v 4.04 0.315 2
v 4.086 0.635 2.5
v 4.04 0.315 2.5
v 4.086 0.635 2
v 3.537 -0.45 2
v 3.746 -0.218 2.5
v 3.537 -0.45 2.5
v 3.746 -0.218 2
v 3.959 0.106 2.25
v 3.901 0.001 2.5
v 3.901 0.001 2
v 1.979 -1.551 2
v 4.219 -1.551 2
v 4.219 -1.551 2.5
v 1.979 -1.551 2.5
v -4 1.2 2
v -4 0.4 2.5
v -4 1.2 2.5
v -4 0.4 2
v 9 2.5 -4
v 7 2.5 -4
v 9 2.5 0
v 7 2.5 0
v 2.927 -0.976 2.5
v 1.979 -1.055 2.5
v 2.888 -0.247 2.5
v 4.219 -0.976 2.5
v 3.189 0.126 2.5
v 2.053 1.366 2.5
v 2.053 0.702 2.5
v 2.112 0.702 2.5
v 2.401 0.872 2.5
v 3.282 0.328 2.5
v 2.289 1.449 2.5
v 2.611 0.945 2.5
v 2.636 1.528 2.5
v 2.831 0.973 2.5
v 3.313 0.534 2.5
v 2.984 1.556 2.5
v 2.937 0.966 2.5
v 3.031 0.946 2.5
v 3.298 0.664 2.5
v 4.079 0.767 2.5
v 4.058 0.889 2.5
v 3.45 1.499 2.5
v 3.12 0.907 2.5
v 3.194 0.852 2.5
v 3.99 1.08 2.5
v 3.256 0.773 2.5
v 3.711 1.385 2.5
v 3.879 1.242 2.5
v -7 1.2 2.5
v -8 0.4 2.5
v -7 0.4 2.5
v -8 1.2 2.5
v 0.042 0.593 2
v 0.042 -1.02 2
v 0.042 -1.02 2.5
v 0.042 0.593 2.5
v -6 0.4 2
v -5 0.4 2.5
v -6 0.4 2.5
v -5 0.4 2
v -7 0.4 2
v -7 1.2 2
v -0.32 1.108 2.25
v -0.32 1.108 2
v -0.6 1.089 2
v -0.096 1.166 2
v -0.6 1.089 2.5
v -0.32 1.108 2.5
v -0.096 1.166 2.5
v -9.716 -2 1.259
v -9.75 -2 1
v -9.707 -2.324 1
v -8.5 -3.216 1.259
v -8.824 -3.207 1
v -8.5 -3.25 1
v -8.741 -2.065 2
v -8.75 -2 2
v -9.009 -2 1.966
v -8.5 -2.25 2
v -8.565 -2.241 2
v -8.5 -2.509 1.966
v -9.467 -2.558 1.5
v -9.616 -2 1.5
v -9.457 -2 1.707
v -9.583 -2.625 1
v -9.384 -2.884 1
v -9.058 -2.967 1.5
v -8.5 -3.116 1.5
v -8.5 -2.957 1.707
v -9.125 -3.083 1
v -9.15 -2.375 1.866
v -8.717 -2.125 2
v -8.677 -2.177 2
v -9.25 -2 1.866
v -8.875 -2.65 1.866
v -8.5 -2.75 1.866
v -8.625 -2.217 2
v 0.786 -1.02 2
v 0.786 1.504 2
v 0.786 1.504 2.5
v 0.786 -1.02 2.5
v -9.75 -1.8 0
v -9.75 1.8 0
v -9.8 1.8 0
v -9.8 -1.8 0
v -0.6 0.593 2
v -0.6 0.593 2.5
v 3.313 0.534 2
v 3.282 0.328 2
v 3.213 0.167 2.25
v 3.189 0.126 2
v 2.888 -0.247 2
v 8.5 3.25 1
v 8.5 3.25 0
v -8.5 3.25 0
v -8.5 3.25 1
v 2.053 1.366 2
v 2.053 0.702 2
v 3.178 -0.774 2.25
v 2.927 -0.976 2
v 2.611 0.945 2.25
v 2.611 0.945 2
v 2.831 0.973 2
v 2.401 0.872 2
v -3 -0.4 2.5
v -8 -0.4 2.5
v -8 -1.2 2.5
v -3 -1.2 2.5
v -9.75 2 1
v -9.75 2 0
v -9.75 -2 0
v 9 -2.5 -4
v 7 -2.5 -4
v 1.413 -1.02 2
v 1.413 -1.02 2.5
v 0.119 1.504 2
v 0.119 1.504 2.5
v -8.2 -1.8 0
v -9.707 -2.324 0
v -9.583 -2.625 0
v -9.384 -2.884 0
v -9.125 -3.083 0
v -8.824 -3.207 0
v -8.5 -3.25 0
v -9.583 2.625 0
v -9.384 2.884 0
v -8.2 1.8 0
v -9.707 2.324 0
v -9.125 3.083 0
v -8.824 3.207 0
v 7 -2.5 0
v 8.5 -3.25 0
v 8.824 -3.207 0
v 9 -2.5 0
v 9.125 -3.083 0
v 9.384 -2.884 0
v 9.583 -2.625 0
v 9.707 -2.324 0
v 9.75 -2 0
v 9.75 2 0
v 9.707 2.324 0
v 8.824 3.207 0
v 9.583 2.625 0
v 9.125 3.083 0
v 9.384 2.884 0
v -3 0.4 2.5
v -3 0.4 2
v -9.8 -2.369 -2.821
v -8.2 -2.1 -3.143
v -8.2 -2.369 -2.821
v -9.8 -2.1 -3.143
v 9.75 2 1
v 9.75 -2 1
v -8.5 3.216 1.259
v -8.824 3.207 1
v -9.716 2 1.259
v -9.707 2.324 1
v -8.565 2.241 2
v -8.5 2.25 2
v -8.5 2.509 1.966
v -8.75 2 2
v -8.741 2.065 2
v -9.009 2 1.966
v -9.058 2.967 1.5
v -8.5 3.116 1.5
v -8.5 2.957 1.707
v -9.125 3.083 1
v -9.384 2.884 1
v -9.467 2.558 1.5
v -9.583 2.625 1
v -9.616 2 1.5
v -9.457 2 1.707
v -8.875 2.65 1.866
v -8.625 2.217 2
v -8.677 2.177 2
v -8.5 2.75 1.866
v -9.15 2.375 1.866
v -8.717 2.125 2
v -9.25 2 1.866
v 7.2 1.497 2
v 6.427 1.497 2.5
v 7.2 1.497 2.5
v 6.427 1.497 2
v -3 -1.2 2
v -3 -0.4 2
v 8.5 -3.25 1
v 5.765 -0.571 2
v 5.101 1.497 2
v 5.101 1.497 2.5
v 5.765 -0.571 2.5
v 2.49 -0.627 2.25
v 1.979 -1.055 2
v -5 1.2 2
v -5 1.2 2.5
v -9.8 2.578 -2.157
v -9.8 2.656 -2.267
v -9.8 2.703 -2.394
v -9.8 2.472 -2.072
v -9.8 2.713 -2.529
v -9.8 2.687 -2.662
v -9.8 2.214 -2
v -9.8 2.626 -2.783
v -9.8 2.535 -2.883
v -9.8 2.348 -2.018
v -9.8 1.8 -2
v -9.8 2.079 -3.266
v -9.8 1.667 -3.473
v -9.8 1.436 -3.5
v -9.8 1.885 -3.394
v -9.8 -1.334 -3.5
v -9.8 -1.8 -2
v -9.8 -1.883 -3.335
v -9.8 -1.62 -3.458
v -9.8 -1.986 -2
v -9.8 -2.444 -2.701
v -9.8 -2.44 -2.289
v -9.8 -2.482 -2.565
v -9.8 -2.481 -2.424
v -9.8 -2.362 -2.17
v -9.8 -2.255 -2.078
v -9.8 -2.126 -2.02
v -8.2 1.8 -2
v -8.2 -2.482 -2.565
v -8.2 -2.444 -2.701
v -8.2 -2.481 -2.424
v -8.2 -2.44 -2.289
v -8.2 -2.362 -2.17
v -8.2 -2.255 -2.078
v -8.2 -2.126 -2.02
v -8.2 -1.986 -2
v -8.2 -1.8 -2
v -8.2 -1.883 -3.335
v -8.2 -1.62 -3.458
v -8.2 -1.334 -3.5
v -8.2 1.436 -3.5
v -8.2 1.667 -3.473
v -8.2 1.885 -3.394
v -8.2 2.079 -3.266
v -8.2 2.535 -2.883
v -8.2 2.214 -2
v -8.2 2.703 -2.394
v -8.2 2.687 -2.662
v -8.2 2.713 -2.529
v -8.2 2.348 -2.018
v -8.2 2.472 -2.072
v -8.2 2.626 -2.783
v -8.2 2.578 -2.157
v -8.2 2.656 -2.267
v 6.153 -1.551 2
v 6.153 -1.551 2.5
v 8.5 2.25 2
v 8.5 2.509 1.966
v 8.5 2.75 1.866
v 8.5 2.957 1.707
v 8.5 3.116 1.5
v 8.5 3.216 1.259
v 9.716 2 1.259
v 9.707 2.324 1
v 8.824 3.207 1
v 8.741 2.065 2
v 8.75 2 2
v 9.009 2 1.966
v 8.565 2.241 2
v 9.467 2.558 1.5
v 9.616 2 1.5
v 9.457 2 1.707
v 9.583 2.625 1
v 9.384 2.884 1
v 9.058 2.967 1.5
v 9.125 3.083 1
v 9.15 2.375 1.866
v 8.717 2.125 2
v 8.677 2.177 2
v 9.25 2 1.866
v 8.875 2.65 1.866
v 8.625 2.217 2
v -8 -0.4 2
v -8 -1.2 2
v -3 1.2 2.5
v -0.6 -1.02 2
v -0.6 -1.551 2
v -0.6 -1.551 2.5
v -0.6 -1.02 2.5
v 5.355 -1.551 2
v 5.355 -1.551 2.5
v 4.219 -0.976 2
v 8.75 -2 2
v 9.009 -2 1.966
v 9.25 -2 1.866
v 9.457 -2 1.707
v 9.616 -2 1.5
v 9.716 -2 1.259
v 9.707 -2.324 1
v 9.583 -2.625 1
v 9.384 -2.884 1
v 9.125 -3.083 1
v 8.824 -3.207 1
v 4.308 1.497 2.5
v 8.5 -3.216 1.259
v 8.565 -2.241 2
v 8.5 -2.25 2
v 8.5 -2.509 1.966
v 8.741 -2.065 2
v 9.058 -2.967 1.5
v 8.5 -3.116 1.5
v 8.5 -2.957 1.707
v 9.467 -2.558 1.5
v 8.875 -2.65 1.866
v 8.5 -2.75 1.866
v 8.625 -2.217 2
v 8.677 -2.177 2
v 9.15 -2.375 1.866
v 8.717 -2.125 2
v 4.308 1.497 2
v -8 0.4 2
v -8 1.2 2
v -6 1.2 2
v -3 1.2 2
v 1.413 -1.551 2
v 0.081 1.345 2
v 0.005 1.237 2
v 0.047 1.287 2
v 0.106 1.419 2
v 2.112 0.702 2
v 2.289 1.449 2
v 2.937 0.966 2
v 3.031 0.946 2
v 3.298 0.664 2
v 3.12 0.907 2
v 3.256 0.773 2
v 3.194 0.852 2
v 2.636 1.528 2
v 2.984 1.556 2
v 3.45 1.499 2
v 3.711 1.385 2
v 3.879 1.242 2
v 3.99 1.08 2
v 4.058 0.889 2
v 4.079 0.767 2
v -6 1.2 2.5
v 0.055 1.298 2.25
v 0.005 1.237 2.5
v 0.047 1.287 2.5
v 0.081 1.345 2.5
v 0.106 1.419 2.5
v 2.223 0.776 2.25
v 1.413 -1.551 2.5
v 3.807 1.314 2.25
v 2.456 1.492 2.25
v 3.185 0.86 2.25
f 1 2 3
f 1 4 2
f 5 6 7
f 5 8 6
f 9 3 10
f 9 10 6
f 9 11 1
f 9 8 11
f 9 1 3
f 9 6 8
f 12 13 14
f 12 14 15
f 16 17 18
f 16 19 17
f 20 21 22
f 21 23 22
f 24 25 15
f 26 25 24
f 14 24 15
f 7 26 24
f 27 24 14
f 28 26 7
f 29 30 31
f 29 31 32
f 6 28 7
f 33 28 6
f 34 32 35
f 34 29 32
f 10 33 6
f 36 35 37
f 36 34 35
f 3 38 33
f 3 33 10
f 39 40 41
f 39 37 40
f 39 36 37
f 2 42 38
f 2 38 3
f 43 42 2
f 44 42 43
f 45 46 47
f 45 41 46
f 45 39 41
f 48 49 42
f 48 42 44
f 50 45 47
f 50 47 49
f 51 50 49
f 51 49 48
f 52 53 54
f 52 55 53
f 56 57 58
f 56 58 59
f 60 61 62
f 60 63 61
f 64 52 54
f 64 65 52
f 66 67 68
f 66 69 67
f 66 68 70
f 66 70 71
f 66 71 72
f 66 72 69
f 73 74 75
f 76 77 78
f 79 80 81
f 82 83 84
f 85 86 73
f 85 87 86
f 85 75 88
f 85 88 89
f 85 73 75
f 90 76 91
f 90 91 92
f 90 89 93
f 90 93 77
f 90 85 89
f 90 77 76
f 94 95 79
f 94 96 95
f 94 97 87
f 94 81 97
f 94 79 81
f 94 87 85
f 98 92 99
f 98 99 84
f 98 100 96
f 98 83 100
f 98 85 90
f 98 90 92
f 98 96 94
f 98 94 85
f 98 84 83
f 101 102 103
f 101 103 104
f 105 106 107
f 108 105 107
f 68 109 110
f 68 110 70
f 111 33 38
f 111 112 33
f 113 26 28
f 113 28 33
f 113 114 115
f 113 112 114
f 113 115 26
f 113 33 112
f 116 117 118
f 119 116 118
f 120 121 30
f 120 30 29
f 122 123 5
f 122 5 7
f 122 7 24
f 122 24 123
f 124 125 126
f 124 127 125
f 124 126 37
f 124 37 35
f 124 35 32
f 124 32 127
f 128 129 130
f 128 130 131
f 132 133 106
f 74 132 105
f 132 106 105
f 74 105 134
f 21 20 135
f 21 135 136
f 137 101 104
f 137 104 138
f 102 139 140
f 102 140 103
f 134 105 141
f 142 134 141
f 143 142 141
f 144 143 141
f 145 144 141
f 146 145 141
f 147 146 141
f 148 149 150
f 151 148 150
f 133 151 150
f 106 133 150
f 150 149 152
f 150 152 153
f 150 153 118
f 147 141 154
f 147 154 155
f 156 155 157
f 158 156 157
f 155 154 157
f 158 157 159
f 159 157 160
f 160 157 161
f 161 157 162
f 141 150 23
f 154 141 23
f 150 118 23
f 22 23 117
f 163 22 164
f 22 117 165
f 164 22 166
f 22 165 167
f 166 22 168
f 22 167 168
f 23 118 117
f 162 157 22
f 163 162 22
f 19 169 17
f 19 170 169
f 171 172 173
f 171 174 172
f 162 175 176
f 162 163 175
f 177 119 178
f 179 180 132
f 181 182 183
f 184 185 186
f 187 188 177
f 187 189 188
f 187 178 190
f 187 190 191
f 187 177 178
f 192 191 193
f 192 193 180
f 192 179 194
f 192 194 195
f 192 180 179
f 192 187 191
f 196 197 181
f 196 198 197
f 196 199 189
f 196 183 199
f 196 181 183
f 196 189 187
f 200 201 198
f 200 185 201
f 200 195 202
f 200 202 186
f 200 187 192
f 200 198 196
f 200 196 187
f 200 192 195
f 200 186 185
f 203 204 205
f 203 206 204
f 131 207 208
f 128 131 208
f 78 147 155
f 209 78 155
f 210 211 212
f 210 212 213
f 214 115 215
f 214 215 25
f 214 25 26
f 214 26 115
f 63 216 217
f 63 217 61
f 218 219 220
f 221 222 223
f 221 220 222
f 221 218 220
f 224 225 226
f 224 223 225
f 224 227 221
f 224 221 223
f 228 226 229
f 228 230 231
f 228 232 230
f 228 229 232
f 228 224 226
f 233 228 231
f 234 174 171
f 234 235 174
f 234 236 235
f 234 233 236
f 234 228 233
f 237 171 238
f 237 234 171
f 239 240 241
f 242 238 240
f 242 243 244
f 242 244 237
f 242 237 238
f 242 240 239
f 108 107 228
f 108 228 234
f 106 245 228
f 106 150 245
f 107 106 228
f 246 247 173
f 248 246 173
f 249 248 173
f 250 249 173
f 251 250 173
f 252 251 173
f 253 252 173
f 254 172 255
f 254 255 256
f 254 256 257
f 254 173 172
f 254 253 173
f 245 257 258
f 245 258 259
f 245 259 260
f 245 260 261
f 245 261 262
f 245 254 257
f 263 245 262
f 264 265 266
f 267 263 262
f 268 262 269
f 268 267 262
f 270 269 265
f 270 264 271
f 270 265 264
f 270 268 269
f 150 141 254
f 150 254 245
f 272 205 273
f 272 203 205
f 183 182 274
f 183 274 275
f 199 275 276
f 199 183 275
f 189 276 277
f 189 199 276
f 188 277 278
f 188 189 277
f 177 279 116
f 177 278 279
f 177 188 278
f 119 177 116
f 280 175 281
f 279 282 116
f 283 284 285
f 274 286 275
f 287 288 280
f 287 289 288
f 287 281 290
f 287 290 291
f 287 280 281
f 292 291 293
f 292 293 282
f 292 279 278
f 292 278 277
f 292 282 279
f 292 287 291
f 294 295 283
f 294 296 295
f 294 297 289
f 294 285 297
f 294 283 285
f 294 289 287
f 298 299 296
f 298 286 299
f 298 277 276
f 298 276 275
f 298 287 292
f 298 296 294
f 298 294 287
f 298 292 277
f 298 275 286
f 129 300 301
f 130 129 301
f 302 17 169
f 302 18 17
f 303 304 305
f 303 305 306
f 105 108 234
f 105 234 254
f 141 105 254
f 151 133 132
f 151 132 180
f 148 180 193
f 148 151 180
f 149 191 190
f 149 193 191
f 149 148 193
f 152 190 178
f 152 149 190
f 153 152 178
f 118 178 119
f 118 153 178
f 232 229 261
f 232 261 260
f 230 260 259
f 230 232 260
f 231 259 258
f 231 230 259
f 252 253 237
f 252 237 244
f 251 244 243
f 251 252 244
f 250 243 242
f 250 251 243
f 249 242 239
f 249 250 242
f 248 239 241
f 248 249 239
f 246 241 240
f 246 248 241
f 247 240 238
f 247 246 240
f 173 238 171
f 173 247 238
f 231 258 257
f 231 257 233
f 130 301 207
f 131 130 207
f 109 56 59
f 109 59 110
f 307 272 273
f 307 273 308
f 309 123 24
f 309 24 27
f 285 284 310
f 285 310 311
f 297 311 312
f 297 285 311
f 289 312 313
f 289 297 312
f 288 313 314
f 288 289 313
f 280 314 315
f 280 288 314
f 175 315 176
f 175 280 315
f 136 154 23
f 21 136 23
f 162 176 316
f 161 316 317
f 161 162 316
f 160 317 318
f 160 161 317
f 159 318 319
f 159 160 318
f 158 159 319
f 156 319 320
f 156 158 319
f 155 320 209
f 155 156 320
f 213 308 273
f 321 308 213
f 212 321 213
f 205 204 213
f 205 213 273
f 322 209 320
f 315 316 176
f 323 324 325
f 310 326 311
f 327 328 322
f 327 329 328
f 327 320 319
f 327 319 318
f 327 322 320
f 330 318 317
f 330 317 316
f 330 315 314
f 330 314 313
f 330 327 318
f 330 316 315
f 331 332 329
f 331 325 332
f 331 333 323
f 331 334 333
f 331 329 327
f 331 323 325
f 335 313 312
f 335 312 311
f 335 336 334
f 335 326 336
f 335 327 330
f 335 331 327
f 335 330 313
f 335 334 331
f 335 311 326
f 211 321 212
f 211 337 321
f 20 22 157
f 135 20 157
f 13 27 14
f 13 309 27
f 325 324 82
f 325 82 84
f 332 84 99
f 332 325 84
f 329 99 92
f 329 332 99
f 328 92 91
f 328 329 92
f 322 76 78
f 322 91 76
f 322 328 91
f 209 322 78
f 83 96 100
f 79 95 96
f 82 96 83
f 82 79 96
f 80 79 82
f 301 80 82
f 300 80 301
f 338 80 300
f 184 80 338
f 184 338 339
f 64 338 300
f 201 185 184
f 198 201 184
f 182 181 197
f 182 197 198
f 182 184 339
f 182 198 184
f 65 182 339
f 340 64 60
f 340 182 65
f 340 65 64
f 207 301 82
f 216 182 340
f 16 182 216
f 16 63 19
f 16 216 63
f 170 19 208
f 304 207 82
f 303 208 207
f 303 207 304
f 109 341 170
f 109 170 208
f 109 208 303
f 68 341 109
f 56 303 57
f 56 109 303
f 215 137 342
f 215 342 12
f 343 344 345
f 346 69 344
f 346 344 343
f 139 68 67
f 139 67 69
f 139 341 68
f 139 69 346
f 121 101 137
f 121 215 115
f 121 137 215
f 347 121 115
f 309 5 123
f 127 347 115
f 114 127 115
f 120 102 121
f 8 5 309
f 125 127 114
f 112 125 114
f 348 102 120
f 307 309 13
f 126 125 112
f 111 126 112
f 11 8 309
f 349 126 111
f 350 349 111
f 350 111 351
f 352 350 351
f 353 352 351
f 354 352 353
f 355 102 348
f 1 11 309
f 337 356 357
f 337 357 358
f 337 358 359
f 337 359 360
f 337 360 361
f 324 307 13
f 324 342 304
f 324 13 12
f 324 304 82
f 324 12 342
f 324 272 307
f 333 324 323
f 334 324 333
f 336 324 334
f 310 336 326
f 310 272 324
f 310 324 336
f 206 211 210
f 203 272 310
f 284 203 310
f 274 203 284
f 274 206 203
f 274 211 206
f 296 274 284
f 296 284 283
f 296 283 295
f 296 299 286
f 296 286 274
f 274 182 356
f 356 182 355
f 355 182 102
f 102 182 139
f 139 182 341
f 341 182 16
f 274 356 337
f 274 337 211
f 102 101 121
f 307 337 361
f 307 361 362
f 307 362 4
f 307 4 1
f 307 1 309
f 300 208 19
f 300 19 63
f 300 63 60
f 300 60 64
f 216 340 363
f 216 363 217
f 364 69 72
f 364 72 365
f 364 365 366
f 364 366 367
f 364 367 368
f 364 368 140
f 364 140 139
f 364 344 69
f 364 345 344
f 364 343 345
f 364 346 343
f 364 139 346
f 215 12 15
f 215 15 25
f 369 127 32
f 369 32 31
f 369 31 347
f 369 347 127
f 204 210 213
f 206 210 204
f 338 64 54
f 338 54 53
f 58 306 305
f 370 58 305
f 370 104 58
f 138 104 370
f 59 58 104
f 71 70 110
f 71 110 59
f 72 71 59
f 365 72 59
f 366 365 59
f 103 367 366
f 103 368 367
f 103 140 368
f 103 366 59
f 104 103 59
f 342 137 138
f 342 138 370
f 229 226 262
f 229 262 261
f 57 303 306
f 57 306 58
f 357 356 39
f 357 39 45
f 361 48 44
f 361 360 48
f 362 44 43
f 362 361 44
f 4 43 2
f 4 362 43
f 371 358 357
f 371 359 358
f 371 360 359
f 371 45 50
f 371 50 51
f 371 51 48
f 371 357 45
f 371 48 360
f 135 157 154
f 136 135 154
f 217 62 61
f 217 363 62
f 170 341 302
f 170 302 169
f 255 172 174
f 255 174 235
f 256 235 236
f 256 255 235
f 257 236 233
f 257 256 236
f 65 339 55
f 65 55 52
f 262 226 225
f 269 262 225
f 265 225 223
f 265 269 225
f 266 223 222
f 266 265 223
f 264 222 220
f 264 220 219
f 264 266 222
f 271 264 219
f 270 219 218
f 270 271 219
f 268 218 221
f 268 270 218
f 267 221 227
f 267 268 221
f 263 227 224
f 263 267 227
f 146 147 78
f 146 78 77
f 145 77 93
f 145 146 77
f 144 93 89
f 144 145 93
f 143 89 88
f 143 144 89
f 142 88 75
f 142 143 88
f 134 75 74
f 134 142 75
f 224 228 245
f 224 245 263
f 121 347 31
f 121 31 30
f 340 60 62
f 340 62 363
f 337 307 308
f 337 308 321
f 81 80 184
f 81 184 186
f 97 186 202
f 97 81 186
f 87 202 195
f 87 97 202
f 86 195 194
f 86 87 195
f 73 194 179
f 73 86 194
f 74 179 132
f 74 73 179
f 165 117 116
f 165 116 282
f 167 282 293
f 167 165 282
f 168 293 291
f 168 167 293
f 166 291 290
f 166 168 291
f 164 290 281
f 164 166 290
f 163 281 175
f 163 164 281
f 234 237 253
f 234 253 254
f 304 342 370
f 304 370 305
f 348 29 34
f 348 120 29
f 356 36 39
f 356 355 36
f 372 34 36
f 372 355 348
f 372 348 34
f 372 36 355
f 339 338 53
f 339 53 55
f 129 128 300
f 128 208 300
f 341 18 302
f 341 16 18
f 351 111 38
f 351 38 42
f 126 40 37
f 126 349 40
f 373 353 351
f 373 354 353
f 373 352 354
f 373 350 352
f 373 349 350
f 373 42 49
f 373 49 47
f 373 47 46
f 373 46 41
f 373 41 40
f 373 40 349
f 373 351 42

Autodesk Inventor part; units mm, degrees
ref_plane "YZ Plane" through (0, 0, 0) normal (1, 0, 0) x (0, 1, 0)
ref_plane "XZ Plane" through (0, 0, 0) normal (0, 1, 0) x (-1, 0, 0)
ref_plane "XY Plane" through (0, 0, 0) normal (0, 0, 1) x (1, 0, 0)
sketch "Sketch1" plane through (0, 0, 0) normal (0, 0, 1) x (1, 0, 0)
  line L0 (10, 0) -> (10, 2) projected
  arc A0 (10, 2) -> (8.5, 3.5) centre (8.5, 2) ccw projected
  line L1 (8.5, 3.5) -> (-8.5, 3.5) projected
  arc A1 (-8.5, 3.5) -> (-10, 2) centre (-8.5, 2) ccw projected
  line L2 (-10, 2) -> (-8, 2) projected
  line L3 (-8, 2) -> (-8, 0) projected
  line L4 (-6, 0) -> (-8, 0) projected
  arc A2 (0, 0) -> (-6, 0) centre (-3, 0) ccw projected
  line L5 (7, 0) -> (0, 0) projected
  line L6 (7, 0) -> (7, 2.5) projected
  line L7 (7, 2.5) -> (9, 2.5) projected
  line L8 (9, 2.5) -> (9, 0) projected
  line L9 (10, 0) -> (9, 0) projected
  line L10 (-8, -2) -> (-10, -2) projected
  arc A3 (-10, -2) -> (-8.5, -3.5) centre (-8.5, -2) ccw projected
  line L11 (8.5, -3.5) -> (-8.5, -3.5) projected
  arc A4 (8.5, -3.5) -> (10, -2) centre (8.5, -2) ccw projected
  line L12 (10, 0) -> (10, -2) projected
  line L13 (9, 0) -> (10, 0) projected
  line L14 (9, 0) -> (9, -2.5) projected
  line L15 (9, -2.5) -> (7, -2.5) projected
  line L16 (7, -2.5) -> (7, 0) projected
  line L17 (0, 0) -> (7, 0) projected
  arc A5 (-6, 0) -> (0, 0) centre (-3, 0) ccw projected
  line L18 (-8, 0) -> (-6, 0) projected
  line L19 (-8, 0) -> (-8, -2) projected
  line L20 (-10, 2) -> (-10, 0) projected
  line L21 (-10, -2) -> (-10, 0) projected
  circle A6 centre (-8.5, 2) radius 1.25
  circle A7 centre (-8.5, -2) radius 1.25
  circle A8 centre (8.5, -2) radius 1.25
  circle A9 centre (8.5, 2) radius 1.25
  line L22 (8.5, 3.25) -> (-8.5, 3.25)
  line L23 (-9.75, 2) -> (-9.75, -2)
  line L24 (-8.5, -3.25) -> (8.5, -3.25)
  line L25 (9.75, 2) -> (9.75, -2)
  dimension "d22" = 0.25
extrude "Extrusion1" add sketch "Sketch1" along normal blind 2 contours L25 A8 L14 L9 | L9 L8 A9 L25 | L14 A8 L15 L16 L6 L7 A9 L8 | A9 L8 L7 | A8 L15 L14 | A9 L7 L8 | L14 L15 A8 | A9 L7 L6 L5 A2 L4 L3 A6 L22 | L24 A7 L19 L4 A5 L5 L16 L15 A8 | A6 L3 L2 | A7 L10 L19 | L2 L3 A6 | A6 L3 L19 A7 L23 | A7 L19 L10 | A5 A2
sketch "Sketch2" plane through (0, 0, 0) normal (0, 0, -1) x (-1, 0, 0)
  line L0 (-9, -2.5) -> (-7, -2.5) projected
  line L1 (-9, 2.5) -> (-9, 0) projected
  line L2 (-7, 2.5) -> (-9, 2.5) projected
  line L3 (-7, 0) -> (-7, 2.5) projected
  line L4 (-7, -2.5) -> (-7, 0) projected
  line L5 (-9, 0) -> (-9, -2.5) projected
  point P0 (0, 0)
extrude "Extrusion2" add sketch "Sketch2" along normal blind 4
sketch "Sketch3" plane through (0, 0, 0) normal (0, 0, -1) x (-1, 0, 0)
  line L0 (8, 2) -> (8, 0) projected
  line L1 (8, 0) -> (8, -2) projected
  line L2 (8, -2) -> (10, -2) projected
  line L3 (10, -2) -> (10, 0) projected
  line L4 (10, 2) -> (10, 0) projected
  line L5 (10, 2) -> (8, 2) projected
  line L6 (9.8, -1.8) -> (8.2, -1.8)
  line L7 (8.2, -1.8) -> (8.2, 1.8)
  line L8 (8.2, 1.8) -> (9.8, 1.8)
  line L9 (9.8, 1.8) -> (9.8, -1.8)
  point P0 (0, 0)
  dimension "d5" = 0.2
  dimension "d6" = 0.2
  dimension "d7" = 0.2
  dimension "d8" = 0.2
extrude "Extrusion3" add sketch "Sketch3" along normal blind 3.5 contours L6 L7 L8 L9
sketch "Sketch4" plane through (-9.8, -1.8, 0) normal (-1, 0, 0) x (0, 0, 1)
  line L0 (-3.5, 0) -> (-3.5, 3.6) projected
  line L1 (0, 3.6) -> (-3.5, 3.6) projected
  line L2 (0, 0) -> (-3.5, 0) projected
  line L3 (-3.5, 0) -> (-2, -1.2586)
  line L4 (-2, -1.2586) -> (-2, 5.3876)
  line L5 (-2, 5.3876) -> (-3.5, 3.6)
  point P0 (0, 1.8)
  dimension "d11" = 50
  dimension "d12" = 50
  dimension "d13" = 1.5
extrude "Extrusion4" add sketch "Sketch4" against normal up to surface (1.6 mm away)
fillet "Fillet2" radius 1 2 edges at (-9, -1.8, -3.5) (-9, 1.8, -3.5)
fillet "Fillet3" radius 0.5 2 edges at (-9, 3.5876, -2) (-9, -3.0586, -2)
fillet "Fillet4" radius 1 5 edges at (9.3839, 2.8839, 2) (9.75, 0, 2) (9.3839, -2.8839, 2) (0, -3.25, 2) (0, 3.25, 2)
sketch "Sketch7" plane through (0, 0, 2) normal (0, 0, 1) x (1, 0, 0)
  line L0 (-6.9276, 0) -> (0, 0) construction
  line L1 (-8, -1.2) -> (-3, -1.2)
  line L2 (-3, -1.2) -> (-3, -0.4)
  line L3 (-3, -0.4) -> (-8, -0.4)
  line L4 (-8, -0.4) -> (-8, -1.2)
  line L5 (-8, 1.2) -> (-7, 1.2)
  line L6 (-7, 1.2) -> (-7, 0.4)
  line L7 (-7, 0.4) -> (-8, 0.4)
  line L8 (-8, 0.4) -> (-8, 1.2)
  line L9 (-6, 0.4) -> (-6, 1.2)
  line L10 (-4, 1.2) -> (-3, 1.2)
  line L11 (-3, 1.2) -> (-3, 0.4)
  line L12 (-3, 0.4) -> (-4, 0.4)
  line L13 (-4, 0.4) -> (-4, 1.2)
  line L14 (-6, 1.2) -> (-5, 1.2)
  line L15 (-5, 1.2) -> (-5, 0.4)
  line L16 (-5, 0.4) -> (-6, 0.4)
  dimension "d31" = 5
  dimension "d32" = 0.8
  dimension "d33" = 0.4
  dimension "d35" = 0.8
  dimension "d36" = 1
  dimension "d37" = 1
  dimension "d38" = 1
  dimension "d39" = 1
  dimension "d40" = 1
  dimension "d41" = 3
  dimension "d42" = 0.4
extrude "Extrusion6" add sketch "Sketch7" along normal blind 0.5
sketch "Sketch8" plane through (0, 0, 2) normal (0, 0, 1) x (1, 0, 0)
  line L0 (-1, 1.5561) -> (6.4631, 1.5561) construction
  line L1 (6.4631, 1.5561) -> (6.4631, -1.5561) construction
  line L2 (6.4631, -1.5561) -> (-1, -1.5561) construction
  line L3 (-1, -1.5561) -> (-1, 1.5561) construction
  line L4 (1.4132, -1.5512) -> (-0.5999, -1.5512)
  line L5 (-0.5999, -1.5512) -> (-0.5999, -1.0201)
  line L6 (-0.5999, -1.0201) -> (0.0423, -1.0201)
  line L7 (0.0423, -1.0201) -> (0.0423, 0.5928)
  line L8 (0.0423, 0.5928) -> (-0.5999, 0.5928)
  line L9 (-0.5999, 0.5928) -> (-0.5999, 1.0893)
  spline S0 degree 2 poles (-0.5999, 1.0893) (-0.4591, 1.0893) (-0.18, 1.1263) (-0.096, 1.1658) knots 0 0 0 1 2 2 2
  spline S1 degree 2 poles (-0.096, 1.1658) (0.0004, 1.2152) (0.109, 1.3807) (0.1189, 1.5042) knots 0 0 0 1 2 2 2
  line L10 (0.1189, 1.5042) -> (0.7858, 1.5042)
  line L11 (0.7858, 1.5042) -> (0.7858, -1.0201)
  line L12 (0.7858, -1.0201) -> (1.4132, -1.0201)
  line L13 (1.4132, -1.0201) -> (1.4132, -1.5512)
  line L14 (4.2191, -1.5512) -> (1.9788, -1.5512)
  line L15 (1.9788, -1.5512) -> (1.9788, -1.0547)
  spline S2 degree 2 poles (1.9788, -1.0547) (2.2629, -0.8275) (2.7174, -0.4273) (2.8878, -0.247) knots 0 0 0 1 2 2 2
  spline S3 degree 2 poles (2.8878, -0.247) (3.1126, -0.0124) (3.3126, 0.3458) (3.3126, 0.5335) knots 0 0 0 1 2 2 2
  spline S4 degree 2 poles (3.3126, 0.5335) (3.3126, 0.7459) (3.0582, 0.9732) (2.831, 0.9732) knots 0 0 0 1 2 2 2
  spline S5 degree 2 poles (2.831, 0.9732) (2.7149, 0.9732) (2.5074, 0.9164) (2.4012, 0.8719) knots 0 0 0 1 2 2 2
  spline S6 degree 2 poles (2.4012, 0.8719) (2.2975, 0.825) (2.1493, 0.7262) (2.1122, 0.7015) knots 0 0 0 1 2 2 2
  line L16 (2.1122, 0.7015) -> (2.0529, 0.7015)
  line L17 (2.0529, 0.7015) -> (2.0529, 1.3659)
  spline S7 degree 2 poles (2.0529, 1.3659) (2.1814, 1.4277) (2.7297, 1.5561) (2.9841, 1.5561) knots 0 0 0 1 2 2 2
  spline S8 degree 2 poles (2.9841, 1.5561) (3.5275, 1.5561) (4.0858, 1.072) (4.0858, 0.6348) knots 0 0 0 1 2 2 2
  spline S9 degree 2 poles (4.0858, 0.6348) (4.0858, 0.3656) (3.8314, -0.1531) (3.5374, -0.4495) knots 0 0 0 1 2 2 2
  spline S10 degree 2 poles (3.5374, -0.4495) (3.3522, -0.6323) (3.0039, -0.9164) (2.9273, -0.9757) knots 0 0 0 1 2 2 2
  line L18 (2.9273, -0.9757) -> (4.2191, -0.9757)
  line L19 (4.2191, -0.9757) -> (4.2191, -1.5512)
  line L20 (7.2005, 1.4968) -> (6.1532, -1.5512)
  line L21 (6.1532, -1.5512) -> (5.3554, -1.5512)
  line L22 (5.3554, -1.5512) -> (4.3081, 1.4968)
  line L23 (4.3081, 1.4968) -> (5.1009, 1.4968)
  line L24 (5.1009, 1.4968) -> (5.7654, -0.5706)
  line L25 (5.7654, -0.5706) -> (6.4273, 1.4968)
  line L26 (6.4273, 1.4968) -> (7.2005, 1.4968)
  point P0 (0, 0)
  dimension "d45" = 3.1122
  dimension "d46" = 1.5561
  dimension "d47" = 1
extrude "Extrusion7" add sketch "Sketch8" along normal blind 0.5
equation "\"d6\" = d5"
equation "\"d7\" = d6"
equation "\"d8\" = d5"
equation "\"d12\" = d11"
equation "\"d33\" = 0.5 * d32"
equation "\"d35\" = d32"
equation "\"d36\" = 0.2 * d31"
equation "\"d37\" = d36"
equation "\"d38\" = d36"
equation "\"d39\" = d36"
equation "\"d40\" = d36"
equation "\"d42\" = d33"
equation "\"d46\" = 0.5 * d45"
properties part number "rubber-flippity-flap" material "Nylon 6/6"
